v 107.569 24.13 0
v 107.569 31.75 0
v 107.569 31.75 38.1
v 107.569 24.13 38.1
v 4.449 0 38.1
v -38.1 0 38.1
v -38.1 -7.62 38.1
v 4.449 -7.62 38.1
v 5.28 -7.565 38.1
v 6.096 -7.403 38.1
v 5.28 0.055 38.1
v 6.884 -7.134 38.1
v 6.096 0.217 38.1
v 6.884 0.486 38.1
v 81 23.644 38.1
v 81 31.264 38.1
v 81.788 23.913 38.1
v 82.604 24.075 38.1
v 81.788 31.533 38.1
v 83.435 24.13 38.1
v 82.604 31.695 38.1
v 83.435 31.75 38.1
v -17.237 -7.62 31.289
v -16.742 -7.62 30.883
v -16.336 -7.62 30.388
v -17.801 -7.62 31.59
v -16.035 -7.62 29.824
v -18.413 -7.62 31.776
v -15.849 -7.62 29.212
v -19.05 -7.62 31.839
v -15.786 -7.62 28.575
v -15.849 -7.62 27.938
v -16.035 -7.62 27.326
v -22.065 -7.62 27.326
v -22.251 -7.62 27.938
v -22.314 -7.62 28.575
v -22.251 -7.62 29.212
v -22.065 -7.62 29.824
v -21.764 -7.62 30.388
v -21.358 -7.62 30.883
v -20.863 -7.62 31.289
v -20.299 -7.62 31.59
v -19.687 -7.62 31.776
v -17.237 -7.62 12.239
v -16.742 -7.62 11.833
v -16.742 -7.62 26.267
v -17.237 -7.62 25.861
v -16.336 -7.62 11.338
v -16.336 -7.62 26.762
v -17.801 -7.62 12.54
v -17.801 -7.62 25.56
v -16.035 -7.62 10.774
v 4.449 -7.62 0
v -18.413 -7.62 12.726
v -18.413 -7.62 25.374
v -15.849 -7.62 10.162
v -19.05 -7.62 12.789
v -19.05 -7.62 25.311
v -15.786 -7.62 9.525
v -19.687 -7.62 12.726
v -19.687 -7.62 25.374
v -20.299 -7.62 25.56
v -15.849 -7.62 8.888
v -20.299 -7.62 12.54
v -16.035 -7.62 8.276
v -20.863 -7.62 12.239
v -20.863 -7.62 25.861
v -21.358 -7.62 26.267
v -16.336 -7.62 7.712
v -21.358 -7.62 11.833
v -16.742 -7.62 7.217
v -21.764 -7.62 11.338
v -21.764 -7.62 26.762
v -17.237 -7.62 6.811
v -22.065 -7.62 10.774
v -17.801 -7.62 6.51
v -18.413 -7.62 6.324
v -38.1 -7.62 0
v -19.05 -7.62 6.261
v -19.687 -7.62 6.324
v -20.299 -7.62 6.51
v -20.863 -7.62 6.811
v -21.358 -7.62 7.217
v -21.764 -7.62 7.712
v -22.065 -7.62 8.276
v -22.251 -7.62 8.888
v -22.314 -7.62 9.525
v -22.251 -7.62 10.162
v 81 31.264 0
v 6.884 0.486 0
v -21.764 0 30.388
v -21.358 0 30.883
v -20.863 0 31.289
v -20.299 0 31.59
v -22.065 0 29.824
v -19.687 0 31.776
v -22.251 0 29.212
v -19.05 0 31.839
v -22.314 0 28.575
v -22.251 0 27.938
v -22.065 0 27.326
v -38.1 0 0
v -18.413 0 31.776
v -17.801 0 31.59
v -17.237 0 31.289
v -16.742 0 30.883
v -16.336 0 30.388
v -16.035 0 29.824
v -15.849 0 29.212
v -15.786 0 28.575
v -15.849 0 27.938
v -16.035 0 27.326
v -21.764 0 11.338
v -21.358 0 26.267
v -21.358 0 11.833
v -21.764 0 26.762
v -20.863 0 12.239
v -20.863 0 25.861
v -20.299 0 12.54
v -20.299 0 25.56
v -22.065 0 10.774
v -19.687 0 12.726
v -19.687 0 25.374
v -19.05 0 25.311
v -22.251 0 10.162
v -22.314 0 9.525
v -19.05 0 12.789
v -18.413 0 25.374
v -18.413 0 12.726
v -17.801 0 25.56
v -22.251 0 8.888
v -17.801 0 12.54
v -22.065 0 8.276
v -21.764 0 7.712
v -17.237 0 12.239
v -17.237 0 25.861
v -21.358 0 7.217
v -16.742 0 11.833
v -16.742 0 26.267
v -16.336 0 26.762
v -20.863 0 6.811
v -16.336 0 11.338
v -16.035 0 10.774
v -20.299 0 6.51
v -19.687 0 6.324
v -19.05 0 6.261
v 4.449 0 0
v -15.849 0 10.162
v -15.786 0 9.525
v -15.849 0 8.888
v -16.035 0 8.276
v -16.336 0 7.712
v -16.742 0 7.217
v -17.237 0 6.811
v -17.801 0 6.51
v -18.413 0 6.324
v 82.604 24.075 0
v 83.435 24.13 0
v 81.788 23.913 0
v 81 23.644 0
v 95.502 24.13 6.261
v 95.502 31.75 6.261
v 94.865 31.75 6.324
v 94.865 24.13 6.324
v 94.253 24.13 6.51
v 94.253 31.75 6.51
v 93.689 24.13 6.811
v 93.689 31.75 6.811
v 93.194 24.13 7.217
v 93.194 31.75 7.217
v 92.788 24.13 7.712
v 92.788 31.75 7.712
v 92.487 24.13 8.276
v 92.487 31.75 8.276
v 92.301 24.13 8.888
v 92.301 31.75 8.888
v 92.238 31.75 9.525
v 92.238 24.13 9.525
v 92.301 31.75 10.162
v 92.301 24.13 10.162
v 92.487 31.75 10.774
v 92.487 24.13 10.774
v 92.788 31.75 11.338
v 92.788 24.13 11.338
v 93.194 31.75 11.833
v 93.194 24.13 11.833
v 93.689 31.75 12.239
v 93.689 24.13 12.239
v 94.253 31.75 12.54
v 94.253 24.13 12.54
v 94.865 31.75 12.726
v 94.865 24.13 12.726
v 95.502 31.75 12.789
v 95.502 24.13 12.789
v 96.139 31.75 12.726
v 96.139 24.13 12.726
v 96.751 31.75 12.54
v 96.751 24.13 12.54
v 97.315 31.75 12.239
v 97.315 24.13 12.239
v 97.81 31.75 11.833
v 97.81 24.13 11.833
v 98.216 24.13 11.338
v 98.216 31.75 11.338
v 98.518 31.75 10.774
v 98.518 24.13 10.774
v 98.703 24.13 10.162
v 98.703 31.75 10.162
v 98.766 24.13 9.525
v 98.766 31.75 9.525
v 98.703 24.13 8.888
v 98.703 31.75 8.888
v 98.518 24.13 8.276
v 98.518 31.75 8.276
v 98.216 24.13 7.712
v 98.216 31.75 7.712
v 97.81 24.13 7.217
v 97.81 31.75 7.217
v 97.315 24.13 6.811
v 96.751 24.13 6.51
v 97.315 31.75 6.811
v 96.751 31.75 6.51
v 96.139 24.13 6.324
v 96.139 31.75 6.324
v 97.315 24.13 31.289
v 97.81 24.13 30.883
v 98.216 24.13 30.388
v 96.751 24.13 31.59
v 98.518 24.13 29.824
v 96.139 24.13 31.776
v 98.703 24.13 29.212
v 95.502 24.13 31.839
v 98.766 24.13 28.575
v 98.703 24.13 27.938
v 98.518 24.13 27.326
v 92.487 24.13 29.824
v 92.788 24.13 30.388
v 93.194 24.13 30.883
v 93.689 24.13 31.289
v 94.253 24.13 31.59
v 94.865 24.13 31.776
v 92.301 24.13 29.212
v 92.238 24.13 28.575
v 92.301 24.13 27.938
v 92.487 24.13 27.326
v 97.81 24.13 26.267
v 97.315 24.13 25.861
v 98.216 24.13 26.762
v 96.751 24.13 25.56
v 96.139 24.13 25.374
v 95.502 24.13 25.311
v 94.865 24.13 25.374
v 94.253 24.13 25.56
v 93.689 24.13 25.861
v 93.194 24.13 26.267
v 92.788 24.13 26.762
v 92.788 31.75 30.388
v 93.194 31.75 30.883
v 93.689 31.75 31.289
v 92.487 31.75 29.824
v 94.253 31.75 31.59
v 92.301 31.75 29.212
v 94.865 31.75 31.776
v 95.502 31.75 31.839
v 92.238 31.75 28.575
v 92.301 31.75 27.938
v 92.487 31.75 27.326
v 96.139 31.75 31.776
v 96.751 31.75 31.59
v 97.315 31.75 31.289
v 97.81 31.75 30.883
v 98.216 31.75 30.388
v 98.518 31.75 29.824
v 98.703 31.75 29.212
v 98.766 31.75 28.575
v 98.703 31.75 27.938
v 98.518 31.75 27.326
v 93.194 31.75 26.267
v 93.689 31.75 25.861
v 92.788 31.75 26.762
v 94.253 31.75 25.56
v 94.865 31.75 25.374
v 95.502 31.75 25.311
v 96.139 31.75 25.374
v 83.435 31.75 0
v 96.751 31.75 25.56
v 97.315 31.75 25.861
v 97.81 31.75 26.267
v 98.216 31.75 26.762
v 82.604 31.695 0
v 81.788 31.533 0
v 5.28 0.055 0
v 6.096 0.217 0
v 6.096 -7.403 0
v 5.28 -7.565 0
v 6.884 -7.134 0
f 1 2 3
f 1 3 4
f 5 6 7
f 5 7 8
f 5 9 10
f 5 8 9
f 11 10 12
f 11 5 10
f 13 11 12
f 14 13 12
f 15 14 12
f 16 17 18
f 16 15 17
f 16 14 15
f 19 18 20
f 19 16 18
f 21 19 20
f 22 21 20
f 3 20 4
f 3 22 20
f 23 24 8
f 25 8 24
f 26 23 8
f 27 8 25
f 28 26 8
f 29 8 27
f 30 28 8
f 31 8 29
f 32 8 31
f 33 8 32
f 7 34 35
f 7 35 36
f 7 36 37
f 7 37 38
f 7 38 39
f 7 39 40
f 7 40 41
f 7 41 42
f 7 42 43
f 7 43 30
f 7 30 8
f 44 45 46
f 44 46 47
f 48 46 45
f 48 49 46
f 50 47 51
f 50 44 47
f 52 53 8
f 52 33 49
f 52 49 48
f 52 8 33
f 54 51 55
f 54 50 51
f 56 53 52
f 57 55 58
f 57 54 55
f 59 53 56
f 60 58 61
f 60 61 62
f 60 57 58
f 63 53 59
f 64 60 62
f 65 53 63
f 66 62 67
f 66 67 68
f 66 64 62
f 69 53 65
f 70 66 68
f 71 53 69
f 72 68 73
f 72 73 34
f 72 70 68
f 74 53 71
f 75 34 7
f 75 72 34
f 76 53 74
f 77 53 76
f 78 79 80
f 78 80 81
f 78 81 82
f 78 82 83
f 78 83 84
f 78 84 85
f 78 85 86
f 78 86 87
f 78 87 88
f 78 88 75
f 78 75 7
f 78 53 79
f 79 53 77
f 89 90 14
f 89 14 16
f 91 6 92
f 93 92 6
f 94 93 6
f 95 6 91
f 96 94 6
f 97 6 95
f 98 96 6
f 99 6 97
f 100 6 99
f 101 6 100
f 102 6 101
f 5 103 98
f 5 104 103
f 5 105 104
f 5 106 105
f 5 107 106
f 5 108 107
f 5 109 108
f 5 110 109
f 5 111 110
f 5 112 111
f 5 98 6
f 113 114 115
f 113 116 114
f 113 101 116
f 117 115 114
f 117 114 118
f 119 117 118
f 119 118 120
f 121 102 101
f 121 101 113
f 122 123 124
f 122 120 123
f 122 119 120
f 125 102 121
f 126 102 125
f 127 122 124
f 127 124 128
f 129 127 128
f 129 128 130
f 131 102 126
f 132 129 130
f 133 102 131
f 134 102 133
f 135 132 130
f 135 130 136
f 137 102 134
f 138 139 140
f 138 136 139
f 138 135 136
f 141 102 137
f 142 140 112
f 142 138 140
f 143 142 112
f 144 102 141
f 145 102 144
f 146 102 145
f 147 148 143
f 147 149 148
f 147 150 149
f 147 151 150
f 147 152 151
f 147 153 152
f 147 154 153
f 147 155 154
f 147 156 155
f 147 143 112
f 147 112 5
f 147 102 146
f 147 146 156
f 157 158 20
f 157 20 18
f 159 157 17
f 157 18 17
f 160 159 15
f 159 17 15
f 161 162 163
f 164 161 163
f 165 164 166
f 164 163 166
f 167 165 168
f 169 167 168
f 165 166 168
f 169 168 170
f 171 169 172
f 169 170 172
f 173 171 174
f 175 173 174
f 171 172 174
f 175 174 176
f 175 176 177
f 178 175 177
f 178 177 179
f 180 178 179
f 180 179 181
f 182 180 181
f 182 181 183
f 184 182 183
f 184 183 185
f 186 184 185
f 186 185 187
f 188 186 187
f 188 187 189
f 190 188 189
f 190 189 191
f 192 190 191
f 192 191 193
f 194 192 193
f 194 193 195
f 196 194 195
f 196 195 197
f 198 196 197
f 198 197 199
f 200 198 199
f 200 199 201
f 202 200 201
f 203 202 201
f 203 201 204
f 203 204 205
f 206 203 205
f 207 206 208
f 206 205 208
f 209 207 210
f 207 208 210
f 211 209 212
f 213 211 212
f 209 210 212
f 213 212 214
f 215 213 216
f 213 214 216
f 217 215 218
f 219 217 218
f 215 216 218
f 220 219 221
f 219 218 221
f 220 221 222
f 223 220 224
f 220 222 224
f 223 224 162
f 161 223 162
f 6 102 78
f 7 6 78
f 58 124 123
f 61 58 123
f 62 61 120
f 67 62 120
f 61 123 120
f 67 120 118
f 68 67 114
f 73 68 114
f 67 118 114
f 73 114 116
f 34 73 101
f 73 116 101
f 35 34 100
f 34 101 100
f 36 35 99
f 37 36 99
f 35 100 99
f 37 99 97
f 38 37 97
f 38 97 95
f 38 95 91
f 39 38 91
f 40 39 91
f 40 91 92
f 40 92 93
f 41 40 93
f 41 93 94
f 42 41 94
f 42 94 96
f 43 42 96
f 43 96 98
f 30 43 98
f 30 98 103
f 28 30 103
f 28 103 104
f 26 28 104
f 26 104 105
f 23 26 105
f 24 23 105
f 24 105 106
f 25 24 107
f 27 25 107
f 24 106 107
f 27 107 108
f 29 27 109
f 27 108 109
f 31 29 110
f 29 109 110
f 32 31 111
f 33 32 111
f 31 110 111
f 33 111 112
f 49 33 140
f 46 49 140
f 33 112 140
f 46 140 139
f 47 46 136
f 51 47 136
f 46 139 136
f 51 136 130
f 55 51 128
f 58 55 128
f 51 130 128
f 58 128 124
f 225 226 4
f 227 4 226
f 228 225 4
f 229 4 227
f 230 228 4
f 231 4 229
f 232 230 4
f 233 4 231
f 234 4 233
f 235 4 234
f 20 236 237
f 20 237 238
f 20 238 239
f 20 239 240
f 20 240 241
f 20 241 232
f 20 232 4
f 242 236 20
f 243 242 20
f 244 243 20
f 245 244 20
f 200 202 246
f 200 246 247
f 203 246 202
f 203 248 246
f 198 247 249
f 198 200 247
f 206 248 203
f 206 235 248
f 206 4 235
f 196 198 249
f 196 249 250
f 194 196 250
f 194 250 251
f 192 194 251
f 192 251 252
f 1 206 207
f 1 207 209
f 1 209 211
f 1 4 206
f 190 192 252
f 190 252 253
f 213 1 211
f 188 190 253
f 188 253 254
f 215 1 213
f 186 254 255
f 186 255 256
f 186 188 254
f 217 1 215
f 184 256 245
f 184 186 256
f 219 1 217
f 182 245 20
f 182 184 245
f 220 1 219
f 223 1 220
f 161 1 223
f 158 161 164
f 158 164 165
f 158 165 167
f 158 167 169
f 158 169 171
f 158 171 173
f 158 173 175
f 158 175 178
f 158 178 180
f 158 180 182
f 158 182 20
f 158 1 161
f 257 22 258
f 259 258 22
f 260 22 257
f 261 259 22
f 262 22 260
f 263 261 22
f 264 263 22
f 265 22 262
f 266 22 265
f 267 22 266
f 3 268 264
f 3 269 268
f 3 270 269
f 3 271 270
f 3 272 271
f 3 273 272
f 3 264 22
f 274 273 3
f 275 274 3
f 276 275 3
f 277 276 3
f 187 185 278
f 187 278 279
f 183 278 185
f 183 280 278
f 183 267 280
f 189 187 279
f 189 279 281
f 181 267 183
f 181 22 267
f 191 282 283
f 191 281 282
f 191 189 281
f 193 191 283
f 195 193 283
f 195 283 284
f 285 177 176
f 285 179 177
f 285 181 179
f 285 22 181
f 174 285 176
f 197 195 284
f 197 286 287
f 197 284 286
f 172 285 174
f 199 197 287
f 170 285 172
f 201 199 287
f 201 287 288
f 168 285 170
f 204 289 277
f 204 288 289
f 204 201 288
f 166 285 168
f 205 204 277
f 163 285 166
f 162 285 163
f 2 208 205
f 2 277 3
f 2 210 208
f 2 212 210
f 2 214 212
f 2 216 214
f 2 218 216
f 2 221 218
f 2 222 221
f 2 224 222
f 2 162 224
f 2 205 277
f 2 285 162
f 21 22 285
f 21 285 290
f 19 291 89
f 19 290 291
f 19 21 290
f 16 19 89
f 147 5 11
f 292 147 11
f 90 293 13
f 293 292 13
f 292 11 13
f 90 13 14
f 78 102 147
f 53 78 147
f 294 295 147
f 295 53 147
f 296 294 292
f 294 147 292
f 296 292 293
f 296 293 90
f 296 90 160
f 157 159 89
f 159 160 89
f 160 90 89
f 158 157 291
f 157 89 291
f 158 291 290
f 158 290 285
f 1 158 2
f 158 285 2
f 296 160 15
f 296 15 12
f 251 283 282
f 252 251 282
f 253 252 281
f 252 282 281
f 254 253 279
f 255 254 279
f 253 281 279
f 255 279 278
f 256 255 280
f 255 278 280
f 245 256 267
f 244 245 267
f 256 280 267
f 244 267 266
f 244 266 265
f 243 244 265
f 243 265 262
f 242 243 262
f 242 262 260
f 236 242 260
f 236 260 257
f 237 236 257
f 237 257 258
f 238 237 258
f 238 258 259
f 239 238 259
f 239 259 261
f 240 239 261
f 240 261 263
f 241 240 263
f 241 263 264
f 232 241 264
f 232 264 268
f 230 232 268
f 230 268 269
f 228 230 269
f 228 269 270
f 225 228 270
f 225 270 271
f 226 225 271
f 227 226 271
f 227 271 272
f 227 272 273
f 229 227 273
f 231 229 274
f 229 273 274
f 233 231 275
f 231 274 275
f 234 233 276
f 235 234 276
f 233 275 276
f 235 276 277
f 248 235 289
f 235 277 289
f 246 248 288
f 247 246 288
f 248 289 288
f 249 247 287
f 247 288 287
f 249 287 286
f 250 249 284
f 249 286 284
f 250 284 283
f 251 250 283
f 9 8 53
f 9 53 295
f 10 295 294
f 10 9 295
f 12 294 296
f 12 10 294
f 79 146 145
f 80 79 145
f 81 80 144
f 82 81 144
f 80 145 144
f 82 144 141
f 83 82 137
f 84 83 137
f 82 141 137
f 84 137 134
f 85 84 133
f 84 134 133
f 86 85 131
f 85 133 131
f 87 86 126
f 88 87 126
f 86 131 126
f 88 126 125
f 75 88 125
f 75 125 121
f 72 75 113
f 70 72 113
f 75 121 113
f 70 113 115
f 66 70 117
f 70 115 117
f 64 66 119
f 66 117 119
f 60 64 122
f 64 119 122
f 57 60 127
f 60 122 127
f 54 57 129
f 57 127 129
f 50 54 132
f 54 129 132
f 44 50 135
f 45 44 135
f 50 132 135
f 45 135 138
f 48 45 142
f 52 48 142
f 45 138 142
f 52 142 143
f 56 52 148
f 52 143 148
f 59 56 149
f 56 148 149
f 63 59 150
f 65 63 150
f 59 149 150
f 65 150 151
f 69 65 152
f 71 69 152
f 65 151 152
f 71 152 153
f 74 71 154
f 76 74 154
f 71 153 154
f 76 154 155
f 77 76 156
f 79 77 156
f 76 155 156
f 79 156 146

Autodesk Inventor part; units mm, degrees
ref_plane "YZ Plane" through (0, 0, 0) normal (1, 0, 0) x (0, 1, 0)
ref_plane "XZ Plane" through (0, 0, 0) normal (0, 1, 0) x (-1, 0, 0)
ref_plane "XY Plane" through (0, 0, 0) normal (0, 0, 1) x (1, 0, 0)
sketch "Sketch1" plane through (0, 0, 0) normal (0, 0, 1) x (1, 0, 0)
  line L0 (5.715, 0) -> (82.169, 31.75)
  line L1 (82.169, 31.75) -> (107.569, 31.75)
  line L2 (107.569, 31.75) -> (107.569, 24.13)
  line L3 (107.569, 24.13) -> (82.169, 24.13)
  line L4 (82.169, 24.13) -> (5.715, -7.62)
  line L5 (5.715, -7.62) -> (-38.1, -7.62)
  line L6 (-38.1, 0) -> (-38.1, -7.62)
  line L7 (-38.1, 0) -> (5.715, 0)
  point P0 (0, 0)
  dimension "d8" = 7.62
  dimension "d9" = 7.62
  dimension "d13" = 145.669
  dimension "d21" = 38.1
  dimension "d22" = 5.715
  dimension "d23" = 43.815
  dimension "d24" = 76.454
  dimension "d25" = 25.4
  dimension "d26" = 7.62
  dimension "d49" = 31.75
extrude "Extrusion1" add sketch "Sketch1" along normal blind 38.1
fillet "Fillet1" radius 6.35 4 edges at (5.715, -7.62, 19.05) (5.715, 0, 19.05) (82.169, 31.75, 19.05) (82.169, 24.13, 19.05)
sketch "Sketch2" plane through (107.569, 24.13, 0) normal (0, -1, 0) x (1, 0, 0)
  line L0 (-24.1339, 0) -> (-24.1339, 38.1) projected
  line L1 (-24.1339, 0) -> (0, 0) projected
  line L2 (0, 0) -> (0, 38.1) projected
  line L3 (-24.1339, 38.1) -> (0, 38.1) projected
  line L4 (-12.0669, 38.1) -> (-12.0669, 0) construction
  line L5 (0, 19.05) -> (-24.1339, 19.05) construction
  point P0 (-107.569, 0)
  point P1 (-12.0669, 9.525)
  point P2 (-12.0669, 28.575)
  dimension "d30" = 9.525
  dimension "d31" = 9.525
sketch "Sketch3" plane through (-38.1, -7.62, 0) normal (0, -1, 0) x (1, 0, 0)
  line L0 (0, 38.1) -> (42.5489, 38.1) projected
  line L1 (0, 0) -> (0, 38.1) projected
  line L2 (0, 0) -> (42.5489, 0) projected
  line L3 (19.05, 38.1) -> (19.05, 0)
  point P0 (38.1, 0)
  point P1 (19.05, 28.575)
  point P2 (19.05, 9.525)
  dimension "d32" = 19.05
  dimension "d33" = 9.525
  dimension "d34" = 9.525
hole "Hole1" at (95.5021, 24.13, 28.575) at (95.5021, 24.13, 9.525) direction (0, 1, 0) diameter 6.5278 end through all clearance for "Flat Head Machine Screw (82)" size "1/4" standard "Ansi Unified Screw Threads"
hole "Hole2" at (-19.05, -7.62, 28.575) at (-19.05, -7.62, 9.525) direction (0, 1, 0) diameter 6.5278 end through all clearance for "Flat Head Machine Screw (82)" size "1/4" standard "Ansi Unified Screw Threads"
equation "\"d31\" = d30"
equation "\"d34\" = d33"
properties part number "Y_shaft_support_brace_B" material "Aluminum 6061"
